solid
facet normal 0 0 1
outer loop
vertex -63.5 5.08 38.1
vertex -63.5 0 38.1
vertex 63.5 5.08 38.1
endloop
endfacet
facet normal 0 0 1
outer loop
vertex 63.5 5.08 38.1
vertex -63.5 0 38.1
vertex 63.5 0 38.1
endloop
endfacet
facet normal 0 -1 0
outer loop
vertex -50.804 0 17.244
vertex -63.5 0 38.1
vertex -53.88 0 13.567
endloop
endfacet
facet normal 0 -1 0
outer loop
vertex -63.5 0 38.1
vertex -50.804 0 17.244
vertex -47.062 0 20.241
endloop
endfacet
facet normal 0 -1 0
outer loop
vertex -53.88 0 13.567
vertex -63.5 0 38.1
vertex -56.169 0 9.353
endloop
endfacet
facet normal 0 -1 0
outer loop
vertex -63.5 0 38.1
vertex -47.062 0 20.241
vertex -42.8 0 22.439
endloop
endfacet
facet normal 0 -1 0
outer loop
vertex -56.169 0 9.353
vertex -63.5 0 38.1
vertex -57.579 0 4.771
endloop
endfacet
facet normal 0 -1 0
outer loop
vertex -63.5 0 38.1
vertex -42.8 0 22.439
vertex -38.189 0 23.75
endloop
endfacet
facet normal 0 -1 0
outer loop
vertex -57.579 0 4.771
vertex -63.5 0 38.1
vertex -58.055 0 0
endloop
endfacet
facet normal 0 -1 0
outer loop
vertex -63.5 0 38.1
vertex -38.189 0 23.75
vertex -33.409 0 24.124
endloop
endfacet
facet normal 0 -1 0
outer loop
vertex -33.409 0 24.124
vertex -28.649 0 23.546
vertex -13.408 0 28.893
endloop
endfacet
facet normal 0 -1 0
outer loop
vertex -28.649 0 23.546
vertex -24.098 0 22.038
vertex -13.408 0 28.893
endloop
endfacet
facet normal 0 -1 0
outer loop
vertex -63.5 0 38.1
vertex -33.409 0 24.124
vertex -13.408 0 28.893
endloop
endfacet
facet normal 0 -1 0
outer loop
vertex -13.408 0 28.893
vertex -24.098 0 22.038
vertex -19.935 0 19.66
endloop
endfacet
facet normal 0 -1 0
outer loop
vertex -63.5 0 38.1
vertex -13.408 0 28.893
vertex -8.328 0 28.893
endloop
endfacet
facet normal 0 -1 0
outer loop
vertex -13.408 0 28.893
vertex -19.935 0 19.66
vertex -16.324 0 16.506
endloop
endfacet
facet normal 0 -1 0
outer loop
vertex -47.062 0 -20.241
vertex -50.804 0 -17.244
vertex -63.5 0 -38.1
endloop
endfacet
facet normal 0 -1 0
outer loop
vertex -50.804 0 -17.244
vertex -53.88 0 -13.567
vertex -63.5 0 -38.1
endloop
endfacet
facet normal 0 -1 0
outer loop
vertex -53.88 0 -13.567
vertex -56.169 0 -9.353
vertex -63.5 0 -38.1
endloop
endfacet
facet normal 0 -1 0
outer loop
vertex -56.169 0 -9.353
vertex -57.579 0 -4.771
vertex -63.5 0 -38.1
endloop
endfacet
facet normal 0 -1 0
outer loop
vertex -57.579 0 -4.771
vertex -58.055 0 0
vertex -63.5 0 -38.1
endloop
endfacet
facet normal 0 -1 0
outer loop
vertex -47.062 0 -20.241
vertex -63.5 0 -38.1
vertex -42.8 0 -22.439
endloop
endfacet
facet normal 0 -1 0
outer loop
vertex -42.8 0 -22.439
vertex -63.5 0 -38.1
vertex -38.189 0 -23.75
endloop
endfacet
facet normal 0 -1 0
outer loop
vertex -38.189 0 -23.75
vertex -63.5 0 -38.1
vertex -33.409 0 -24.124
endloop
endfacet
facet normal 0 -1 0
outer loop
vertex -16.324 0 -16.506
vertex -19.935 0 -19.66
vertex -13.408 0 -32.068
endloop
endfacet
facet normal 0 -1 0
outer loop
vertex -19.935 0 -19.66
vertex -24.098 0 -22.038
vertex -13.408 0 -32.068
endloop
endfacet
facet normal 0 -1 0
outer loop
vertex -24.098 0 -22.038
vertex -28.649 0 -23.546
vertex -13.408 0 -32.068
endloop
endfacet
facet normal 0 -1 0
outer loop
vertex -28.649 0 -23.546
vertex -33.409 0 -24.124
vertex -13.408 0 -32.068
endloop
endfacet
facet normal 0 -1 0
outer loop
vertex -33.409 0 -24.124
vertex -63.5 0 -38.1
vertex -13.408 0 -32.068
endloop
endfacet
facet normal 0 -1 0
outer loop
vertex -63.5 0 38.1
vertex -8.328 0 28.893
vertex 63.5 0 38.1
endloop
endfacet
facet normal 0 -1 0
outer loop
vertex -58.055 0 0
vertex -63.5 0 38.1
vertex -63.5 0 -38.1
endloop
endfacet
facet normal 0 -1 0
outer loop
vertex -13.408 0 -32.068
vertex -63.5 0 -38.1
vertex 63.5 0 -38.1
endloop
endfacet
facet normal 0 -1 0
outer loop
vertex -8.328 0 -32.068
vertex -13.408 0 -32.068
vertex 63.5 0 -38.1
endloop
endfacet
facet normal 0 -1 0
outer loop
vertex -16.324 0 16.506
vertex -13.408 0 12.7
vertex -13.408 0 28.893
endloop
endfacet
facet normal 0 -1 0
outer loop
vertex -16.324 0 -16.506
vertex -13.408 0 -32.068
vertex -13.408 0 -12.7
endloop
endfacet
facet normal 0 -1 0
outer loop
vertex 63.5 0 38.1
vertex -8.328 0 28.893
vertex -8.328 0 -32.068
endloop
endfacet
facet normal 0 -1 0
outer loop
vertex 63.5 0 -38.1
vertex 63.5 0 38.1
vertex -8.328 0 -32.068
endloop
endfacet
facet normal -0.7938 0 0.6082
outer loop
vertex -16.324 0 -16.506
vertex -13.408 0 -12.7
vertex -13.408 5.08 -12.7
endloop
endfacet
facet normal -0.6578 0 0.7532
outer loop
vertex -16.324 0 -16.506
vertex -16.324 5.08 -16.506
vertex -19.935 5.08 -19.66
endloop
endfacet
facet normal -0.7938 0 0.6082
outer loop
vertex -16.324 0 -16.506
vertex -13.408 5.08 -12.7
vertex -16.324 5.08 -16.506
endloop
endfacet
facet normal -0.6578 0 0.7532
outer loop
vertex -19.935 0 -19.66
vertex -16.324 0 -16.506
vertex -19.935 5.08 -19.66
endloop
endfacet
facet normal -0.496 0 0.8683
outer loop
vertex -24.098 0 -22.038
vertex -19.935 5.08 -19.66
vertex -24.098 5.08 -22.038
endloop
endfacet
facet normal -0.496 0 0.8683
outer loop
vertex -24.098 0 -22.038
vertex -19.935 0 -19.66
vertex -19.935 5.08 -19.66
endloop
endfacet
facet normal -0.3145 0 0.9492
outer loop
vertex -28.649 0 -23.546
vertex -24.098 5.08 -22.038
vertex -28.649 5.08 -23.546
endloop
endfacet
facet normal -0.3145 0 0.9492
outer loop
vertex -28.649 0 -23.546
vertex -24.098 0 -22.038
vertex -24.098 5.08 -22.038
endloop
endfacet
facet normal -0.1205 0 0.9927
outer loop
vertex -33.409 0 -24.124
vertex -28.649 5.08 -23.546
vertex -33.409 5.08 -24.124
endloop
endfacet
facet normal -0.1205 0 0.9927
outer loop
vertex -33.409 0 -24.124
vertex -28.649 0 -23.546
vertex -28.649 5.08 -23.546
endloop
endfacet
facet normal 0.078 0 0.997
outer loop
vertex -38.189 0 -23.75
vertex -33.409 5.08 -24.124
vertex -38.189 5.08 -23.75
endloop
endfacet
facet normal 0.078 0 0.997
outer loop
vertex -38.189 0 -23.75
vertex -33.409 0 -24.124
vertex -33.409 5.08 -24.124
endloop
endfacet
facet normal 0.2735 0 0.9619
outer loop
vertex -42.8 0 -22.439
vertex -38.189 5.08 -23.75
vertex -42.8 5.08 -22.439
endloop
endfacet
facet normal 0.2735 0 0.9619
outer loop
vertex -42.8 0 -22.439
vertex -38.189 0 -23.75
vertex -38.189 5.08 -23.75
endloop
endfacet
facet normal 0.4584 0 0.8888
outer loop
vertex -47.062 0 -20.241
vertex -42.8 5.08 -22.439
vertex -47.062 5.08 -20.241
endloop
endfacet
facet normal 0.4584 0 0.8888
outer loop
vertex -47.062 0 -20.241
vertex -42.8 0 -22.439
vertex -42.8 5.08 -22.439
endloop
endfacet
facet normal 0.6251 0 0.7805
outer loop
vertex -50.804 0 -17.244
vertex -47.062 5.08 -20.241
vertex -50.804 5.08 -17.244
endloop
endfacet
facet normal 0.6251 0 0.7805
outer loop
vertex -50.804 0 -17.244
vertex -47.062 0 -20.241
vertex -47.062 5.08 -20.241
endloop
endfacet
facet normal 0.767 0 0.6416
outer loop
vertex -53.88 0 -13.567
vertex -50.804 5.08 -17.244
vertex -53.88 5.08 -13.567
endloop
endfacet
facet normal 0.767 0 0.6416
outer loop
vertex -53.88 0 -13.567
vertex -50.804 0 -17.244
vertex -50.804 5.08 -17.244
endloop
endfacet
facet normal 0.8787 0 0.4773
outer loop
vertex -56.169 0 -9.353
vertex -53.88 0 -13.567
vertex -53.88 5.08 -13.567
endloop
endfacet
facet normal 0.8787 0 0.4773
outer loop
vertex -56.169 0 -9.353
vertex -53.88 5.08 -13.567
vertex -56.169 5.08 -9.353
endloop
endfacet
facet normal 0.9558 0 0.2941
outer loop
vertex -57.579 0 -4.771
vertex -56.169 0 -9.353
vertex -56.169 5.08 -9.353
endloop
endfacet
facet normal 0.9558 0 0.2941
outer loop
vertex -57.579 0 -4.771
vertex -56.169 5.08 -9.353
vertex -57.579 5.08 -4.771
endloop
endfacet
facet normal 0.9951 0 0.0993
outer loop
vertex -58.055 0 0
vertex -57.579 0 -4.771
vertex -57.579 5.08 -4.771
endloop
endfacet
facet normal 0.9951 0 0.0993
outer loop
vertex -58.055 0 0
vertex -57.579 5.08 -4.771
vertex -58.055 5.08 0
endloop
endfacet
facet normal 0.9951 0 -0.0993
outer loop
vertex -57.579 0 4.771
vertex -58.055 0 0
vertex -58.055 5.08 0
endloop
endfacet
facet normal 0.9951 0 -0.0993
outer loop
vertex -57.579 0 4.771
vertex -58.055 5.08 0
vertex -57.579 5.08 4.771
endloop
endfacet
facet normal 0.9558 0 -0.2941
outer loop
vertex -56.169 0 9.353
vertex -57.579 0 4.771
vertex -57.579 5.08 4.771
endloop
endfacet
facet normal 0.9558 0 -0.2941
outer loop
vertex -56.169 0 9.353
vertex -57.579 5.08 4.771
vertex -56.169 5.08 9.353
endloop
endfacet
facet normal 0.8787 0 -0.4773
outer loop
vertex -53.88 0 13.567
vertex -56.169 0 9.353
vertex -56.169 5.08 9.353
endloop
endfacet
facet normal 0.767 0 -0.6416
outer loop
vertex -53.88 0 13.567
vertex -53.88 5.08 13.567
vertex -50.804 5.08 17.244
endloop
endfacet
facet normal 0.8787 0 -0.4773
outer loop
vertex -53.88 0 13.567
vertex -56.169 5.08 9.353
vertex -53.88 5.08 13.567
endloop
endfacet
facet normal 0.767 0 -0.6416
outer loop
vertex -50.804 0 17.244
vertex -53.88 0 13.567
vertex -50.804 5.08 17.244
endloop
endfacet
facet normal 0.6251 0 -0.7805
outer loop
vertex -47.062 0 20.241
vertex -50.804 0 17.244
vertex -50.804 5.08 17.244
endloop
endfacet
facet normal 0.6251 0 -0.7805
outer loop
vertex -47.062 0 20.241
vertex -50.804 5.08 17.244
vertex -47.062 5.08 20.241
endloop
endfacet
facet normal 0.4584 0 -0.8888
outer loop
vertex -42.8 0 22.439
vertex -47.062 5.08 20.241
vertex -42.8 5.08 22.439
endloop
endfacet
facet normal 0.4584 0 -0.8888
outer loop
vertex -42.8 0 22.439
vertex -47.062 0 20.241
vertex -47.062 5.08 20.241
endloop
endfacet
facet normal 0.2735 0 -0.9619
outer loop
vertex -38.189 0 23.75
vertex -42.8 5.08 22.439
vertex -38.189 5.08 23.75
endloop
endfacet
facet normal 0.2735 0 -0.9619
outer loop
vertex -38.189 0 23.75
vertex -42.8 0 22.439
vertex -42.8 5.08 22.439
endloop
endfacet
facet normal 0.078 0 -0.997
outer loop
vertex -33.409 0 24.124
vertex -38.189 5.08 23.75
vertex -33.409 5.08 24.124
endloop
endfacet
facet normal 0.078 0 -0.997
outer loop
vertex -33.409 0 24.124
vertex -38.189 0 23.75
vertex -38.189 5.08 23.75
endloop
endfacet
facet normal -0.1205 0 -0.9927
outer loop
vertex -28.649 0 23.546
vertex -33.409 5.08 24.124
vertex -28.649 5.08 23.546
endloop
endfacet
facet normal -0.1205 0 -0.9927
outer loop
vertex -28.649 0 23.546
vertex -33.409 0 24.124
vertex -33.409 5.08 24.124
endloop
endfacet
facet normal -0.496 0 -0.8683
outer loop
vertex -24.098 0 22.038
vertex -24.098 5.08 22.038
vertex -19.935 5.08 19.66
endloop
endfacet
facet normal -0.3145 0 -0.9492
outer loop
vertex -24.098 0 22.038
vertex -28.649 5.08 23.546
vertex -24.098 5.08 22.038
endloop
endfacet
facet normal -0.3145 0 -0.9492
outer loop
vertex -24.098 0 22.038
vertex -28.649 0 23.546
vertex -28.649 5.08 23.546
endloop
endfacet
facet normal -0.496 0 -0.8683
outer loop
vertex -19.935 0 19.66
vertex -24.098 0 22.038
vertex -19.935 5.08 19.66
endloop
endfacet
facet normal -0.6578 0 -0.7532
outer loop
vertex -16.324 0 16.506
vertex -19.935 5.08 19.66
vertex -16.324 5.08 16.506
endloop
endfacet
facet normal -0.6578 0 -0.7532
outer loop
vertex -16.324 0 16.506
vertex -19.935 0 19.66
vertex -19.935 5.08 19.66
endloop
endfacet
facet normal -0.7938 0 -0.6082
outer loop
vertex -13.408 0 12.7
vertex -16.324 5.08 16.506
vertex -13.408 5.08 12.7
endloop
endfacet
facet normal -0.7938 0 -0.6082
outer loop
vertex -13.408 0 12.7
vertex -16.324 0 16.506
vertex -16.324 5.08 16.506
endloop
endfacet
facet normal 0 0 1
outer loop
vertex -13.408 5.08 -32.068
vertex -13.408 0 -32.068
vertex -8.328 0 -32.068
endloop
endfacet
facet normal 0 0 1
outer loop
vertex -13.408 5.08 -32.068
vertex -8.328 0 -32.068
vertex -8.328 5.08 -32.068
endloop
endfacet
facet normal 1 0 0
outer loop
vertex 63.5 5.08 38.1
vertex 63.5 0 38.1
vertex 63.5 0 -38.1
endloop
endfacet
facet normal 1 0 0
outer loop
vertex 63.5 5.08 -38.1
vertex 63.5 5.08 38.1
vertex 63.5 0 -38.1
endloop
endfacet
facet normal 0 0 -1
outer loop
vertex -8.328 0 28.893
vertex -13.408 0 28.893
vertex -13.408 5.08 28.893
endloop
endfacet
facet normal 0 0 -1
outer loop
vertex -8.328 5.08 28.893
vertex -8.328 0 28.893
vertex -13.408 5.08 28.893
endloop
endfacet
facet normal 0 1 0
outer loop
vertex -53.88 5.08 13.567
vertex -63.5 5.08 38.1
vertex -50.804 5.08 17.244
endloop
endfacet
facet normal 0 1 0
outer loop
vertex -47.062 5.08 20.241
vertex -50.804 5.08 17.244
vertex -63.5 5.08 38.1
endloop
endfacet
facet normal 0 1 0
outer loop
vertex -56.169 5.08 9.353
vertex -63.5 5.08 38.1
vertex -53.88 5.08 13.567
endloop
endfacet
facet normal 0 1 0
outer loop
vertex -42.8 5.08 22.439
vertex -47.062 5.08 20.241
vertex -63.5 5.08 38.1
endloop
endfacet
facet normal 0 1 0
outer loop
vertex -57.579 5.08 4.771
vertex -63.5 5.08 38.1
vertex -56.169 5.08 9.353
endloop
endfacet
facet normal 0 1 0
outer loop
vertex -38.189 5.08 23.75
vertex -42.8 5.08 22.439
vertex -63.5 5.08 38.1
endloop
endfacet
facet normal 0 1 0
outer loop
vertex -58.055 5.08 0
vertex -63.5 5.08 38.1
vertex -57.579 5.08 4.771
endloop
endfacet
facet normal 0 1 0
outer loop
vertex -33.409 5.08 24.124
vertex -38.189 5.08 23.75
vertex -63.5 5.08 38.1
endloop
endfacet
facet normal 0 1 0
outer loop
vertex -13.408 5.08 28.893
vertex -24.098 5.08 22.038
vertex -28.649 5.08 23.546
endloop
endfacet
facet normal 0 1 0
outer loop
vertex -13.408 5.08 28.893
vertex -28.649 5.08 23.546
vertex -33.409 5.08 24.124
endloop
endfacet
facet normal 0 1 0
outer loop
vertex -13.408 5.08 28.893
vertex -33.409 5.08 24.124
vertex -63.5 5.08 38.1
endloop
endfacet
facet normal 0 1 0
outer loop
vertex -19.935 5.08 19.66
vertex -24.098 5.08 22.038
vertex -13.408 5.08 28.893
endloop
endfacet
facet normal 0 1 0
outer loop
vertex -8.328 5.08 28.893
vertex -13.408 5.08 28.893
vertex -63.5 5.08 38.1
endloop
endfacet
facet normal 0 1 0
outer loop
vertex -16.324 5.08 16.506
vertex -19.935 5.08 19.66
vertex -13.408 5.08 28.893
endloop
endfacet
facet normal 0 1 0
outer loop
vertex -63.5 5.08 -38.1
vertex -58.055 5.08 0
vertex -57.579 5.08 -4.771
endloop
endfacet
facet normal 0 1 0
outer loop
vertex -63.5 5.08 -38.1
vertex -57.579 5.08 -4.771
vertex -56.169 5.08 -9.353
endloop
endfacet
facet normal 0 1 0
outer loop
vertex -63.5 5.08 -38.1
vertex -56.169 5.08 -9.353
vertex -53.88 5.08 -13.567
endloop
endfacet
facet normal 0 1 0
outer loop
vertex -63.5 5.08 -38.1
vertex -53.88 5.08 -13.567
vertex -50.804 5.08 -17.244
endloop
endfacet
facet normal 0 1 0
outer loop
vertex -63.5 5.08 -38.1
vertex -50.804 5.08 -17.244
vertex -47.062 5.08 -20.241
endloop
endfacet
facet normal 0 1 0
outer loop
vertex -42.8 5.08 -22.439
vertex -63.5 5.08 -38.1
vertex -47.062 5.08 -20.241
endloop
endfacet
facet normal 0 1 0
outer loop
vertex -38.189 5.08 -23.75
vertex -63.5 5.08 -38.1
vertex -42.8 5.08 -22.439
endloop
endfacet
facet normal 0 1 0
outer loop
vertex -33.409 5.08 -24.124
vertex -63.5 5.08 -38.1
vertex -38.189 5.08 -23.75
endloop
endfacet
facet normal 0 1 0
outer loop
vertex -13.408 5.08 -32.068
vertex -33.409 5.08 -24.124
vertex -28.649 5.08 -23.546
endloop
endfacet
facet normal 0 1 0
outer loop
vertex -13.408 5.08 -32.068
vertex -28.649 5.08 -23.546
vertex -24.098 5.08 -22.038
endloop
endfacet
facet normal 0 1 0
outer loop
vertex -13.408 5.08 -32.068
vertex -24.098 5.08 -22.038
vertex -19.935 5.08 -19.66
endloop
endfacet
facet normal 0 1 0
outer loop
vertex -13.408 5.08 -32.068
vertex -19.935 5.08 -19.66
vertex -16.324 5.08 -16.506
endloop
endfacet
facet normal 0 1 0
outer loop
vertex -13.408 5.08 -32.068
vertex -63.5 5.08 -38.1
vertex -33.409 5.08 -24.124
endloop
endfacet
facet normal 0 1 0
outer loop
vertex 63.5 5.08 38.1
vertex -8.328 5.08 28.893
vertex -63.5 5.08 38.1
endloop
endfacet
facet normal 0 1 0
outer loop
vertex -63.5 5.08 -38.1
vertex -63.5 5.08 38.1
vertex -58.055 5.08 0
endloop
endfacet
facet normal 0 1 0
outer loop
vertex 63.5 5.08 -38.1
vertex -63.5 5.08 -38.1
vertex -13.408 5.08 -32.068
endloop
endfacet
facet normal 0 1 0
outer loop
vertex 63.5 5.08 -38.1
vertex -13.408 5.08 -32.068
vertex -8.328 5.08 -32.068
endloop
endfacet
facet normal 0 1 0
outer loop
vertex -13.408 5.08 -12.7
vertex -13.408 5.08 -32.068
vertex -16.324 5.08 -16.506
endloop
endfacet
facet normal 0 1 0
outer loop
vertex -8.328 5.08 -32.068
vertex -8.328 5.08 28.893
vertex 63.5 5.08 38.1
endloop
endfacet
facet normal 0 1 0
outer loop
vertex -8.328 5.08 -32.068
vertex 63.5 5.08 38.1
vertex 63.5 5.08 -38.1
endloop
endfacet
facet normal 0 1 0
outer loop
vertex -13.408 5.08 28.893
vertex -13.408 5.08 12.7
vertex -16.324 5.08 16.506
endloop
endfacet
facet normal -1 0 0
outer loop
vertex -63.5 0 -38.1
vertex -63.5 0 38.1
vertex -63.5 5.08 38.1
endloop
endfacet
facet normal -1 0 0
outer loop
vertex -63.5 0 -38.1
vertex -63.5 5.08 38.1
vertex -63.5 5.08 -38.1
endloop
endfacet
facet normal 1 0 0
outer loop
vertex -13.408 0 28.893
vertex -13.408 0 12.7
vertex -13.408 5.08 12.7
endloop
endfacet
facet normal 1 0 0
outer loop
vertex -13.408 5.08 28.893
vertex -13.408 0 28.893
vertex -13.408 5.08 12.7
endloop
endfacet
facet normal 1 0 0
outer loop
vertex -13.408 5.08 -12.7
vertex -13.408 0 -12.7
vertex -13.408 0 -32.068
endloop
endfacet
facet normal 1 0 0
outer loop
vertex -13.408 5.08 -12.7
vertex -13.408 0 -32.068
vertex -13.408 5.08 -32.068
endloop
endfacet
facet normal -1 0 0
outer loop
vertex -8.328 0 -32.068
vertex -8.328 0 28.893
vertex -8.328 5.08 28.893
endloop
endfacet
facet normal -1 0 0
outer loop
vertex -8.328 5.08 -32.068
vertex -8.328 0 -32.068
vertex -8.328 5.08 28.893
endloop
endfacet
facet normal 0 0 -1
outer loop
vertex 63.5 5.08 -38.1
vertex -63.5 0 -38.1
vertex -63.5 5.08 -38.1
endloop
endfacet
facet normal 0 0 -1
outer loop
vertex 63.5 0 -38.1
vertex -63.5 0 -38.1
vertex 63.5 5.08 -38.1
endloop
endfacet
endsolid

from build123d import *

# Parameters (mm, degrees)
SKETCH1_W           = 127
SKETCH1_H           = 76.2
SKETCH1_R           = 24.13
BOSS_EXTRUDE1_DEPTH = 5.08
CAVITY1_START       = -13.407959225
CAVITY1_OUTLINE_W   = 5.08
CAVITY1_OUTLINE_H   = 60.96
CAVITY1_DEPTH       = 5.08


# Read off the part's stored shape, not the designer's step: Cavity1
with BuildPart() as part:
    # Sketch1 → Boss-Extrude1 (new body)
    with BuildSketch(Plane(origin=(0, 0, 0), x_dir=(1, 0, 0), z_dir=(0, 1, 0))):
        Rectangle(SKETCH1_W, SKETCH1_H)
        with Locations(Location((-33.925370199, 0, 0), (0, 0, 270))):
            Circle(SKETCH1_R, mode=Mode.SUBTRACT)
    extrude(amount=BOSS_EXTRUDE1_DEPTH)

    # Cavity1 outline → Cavity1 (cut)
    with BuildSketch(Plane.YZ.offset(CAVITY1_START)):
        with Locations((2.54, -1.5875)):
            Rectangle(CAVITY1_OUTLINE_W, CAVITY1_OUTLINE_H)
    extrude(amount=CAVITY1_DEPTH, mode=Mode.SUBTRACT)


solid = part.part
